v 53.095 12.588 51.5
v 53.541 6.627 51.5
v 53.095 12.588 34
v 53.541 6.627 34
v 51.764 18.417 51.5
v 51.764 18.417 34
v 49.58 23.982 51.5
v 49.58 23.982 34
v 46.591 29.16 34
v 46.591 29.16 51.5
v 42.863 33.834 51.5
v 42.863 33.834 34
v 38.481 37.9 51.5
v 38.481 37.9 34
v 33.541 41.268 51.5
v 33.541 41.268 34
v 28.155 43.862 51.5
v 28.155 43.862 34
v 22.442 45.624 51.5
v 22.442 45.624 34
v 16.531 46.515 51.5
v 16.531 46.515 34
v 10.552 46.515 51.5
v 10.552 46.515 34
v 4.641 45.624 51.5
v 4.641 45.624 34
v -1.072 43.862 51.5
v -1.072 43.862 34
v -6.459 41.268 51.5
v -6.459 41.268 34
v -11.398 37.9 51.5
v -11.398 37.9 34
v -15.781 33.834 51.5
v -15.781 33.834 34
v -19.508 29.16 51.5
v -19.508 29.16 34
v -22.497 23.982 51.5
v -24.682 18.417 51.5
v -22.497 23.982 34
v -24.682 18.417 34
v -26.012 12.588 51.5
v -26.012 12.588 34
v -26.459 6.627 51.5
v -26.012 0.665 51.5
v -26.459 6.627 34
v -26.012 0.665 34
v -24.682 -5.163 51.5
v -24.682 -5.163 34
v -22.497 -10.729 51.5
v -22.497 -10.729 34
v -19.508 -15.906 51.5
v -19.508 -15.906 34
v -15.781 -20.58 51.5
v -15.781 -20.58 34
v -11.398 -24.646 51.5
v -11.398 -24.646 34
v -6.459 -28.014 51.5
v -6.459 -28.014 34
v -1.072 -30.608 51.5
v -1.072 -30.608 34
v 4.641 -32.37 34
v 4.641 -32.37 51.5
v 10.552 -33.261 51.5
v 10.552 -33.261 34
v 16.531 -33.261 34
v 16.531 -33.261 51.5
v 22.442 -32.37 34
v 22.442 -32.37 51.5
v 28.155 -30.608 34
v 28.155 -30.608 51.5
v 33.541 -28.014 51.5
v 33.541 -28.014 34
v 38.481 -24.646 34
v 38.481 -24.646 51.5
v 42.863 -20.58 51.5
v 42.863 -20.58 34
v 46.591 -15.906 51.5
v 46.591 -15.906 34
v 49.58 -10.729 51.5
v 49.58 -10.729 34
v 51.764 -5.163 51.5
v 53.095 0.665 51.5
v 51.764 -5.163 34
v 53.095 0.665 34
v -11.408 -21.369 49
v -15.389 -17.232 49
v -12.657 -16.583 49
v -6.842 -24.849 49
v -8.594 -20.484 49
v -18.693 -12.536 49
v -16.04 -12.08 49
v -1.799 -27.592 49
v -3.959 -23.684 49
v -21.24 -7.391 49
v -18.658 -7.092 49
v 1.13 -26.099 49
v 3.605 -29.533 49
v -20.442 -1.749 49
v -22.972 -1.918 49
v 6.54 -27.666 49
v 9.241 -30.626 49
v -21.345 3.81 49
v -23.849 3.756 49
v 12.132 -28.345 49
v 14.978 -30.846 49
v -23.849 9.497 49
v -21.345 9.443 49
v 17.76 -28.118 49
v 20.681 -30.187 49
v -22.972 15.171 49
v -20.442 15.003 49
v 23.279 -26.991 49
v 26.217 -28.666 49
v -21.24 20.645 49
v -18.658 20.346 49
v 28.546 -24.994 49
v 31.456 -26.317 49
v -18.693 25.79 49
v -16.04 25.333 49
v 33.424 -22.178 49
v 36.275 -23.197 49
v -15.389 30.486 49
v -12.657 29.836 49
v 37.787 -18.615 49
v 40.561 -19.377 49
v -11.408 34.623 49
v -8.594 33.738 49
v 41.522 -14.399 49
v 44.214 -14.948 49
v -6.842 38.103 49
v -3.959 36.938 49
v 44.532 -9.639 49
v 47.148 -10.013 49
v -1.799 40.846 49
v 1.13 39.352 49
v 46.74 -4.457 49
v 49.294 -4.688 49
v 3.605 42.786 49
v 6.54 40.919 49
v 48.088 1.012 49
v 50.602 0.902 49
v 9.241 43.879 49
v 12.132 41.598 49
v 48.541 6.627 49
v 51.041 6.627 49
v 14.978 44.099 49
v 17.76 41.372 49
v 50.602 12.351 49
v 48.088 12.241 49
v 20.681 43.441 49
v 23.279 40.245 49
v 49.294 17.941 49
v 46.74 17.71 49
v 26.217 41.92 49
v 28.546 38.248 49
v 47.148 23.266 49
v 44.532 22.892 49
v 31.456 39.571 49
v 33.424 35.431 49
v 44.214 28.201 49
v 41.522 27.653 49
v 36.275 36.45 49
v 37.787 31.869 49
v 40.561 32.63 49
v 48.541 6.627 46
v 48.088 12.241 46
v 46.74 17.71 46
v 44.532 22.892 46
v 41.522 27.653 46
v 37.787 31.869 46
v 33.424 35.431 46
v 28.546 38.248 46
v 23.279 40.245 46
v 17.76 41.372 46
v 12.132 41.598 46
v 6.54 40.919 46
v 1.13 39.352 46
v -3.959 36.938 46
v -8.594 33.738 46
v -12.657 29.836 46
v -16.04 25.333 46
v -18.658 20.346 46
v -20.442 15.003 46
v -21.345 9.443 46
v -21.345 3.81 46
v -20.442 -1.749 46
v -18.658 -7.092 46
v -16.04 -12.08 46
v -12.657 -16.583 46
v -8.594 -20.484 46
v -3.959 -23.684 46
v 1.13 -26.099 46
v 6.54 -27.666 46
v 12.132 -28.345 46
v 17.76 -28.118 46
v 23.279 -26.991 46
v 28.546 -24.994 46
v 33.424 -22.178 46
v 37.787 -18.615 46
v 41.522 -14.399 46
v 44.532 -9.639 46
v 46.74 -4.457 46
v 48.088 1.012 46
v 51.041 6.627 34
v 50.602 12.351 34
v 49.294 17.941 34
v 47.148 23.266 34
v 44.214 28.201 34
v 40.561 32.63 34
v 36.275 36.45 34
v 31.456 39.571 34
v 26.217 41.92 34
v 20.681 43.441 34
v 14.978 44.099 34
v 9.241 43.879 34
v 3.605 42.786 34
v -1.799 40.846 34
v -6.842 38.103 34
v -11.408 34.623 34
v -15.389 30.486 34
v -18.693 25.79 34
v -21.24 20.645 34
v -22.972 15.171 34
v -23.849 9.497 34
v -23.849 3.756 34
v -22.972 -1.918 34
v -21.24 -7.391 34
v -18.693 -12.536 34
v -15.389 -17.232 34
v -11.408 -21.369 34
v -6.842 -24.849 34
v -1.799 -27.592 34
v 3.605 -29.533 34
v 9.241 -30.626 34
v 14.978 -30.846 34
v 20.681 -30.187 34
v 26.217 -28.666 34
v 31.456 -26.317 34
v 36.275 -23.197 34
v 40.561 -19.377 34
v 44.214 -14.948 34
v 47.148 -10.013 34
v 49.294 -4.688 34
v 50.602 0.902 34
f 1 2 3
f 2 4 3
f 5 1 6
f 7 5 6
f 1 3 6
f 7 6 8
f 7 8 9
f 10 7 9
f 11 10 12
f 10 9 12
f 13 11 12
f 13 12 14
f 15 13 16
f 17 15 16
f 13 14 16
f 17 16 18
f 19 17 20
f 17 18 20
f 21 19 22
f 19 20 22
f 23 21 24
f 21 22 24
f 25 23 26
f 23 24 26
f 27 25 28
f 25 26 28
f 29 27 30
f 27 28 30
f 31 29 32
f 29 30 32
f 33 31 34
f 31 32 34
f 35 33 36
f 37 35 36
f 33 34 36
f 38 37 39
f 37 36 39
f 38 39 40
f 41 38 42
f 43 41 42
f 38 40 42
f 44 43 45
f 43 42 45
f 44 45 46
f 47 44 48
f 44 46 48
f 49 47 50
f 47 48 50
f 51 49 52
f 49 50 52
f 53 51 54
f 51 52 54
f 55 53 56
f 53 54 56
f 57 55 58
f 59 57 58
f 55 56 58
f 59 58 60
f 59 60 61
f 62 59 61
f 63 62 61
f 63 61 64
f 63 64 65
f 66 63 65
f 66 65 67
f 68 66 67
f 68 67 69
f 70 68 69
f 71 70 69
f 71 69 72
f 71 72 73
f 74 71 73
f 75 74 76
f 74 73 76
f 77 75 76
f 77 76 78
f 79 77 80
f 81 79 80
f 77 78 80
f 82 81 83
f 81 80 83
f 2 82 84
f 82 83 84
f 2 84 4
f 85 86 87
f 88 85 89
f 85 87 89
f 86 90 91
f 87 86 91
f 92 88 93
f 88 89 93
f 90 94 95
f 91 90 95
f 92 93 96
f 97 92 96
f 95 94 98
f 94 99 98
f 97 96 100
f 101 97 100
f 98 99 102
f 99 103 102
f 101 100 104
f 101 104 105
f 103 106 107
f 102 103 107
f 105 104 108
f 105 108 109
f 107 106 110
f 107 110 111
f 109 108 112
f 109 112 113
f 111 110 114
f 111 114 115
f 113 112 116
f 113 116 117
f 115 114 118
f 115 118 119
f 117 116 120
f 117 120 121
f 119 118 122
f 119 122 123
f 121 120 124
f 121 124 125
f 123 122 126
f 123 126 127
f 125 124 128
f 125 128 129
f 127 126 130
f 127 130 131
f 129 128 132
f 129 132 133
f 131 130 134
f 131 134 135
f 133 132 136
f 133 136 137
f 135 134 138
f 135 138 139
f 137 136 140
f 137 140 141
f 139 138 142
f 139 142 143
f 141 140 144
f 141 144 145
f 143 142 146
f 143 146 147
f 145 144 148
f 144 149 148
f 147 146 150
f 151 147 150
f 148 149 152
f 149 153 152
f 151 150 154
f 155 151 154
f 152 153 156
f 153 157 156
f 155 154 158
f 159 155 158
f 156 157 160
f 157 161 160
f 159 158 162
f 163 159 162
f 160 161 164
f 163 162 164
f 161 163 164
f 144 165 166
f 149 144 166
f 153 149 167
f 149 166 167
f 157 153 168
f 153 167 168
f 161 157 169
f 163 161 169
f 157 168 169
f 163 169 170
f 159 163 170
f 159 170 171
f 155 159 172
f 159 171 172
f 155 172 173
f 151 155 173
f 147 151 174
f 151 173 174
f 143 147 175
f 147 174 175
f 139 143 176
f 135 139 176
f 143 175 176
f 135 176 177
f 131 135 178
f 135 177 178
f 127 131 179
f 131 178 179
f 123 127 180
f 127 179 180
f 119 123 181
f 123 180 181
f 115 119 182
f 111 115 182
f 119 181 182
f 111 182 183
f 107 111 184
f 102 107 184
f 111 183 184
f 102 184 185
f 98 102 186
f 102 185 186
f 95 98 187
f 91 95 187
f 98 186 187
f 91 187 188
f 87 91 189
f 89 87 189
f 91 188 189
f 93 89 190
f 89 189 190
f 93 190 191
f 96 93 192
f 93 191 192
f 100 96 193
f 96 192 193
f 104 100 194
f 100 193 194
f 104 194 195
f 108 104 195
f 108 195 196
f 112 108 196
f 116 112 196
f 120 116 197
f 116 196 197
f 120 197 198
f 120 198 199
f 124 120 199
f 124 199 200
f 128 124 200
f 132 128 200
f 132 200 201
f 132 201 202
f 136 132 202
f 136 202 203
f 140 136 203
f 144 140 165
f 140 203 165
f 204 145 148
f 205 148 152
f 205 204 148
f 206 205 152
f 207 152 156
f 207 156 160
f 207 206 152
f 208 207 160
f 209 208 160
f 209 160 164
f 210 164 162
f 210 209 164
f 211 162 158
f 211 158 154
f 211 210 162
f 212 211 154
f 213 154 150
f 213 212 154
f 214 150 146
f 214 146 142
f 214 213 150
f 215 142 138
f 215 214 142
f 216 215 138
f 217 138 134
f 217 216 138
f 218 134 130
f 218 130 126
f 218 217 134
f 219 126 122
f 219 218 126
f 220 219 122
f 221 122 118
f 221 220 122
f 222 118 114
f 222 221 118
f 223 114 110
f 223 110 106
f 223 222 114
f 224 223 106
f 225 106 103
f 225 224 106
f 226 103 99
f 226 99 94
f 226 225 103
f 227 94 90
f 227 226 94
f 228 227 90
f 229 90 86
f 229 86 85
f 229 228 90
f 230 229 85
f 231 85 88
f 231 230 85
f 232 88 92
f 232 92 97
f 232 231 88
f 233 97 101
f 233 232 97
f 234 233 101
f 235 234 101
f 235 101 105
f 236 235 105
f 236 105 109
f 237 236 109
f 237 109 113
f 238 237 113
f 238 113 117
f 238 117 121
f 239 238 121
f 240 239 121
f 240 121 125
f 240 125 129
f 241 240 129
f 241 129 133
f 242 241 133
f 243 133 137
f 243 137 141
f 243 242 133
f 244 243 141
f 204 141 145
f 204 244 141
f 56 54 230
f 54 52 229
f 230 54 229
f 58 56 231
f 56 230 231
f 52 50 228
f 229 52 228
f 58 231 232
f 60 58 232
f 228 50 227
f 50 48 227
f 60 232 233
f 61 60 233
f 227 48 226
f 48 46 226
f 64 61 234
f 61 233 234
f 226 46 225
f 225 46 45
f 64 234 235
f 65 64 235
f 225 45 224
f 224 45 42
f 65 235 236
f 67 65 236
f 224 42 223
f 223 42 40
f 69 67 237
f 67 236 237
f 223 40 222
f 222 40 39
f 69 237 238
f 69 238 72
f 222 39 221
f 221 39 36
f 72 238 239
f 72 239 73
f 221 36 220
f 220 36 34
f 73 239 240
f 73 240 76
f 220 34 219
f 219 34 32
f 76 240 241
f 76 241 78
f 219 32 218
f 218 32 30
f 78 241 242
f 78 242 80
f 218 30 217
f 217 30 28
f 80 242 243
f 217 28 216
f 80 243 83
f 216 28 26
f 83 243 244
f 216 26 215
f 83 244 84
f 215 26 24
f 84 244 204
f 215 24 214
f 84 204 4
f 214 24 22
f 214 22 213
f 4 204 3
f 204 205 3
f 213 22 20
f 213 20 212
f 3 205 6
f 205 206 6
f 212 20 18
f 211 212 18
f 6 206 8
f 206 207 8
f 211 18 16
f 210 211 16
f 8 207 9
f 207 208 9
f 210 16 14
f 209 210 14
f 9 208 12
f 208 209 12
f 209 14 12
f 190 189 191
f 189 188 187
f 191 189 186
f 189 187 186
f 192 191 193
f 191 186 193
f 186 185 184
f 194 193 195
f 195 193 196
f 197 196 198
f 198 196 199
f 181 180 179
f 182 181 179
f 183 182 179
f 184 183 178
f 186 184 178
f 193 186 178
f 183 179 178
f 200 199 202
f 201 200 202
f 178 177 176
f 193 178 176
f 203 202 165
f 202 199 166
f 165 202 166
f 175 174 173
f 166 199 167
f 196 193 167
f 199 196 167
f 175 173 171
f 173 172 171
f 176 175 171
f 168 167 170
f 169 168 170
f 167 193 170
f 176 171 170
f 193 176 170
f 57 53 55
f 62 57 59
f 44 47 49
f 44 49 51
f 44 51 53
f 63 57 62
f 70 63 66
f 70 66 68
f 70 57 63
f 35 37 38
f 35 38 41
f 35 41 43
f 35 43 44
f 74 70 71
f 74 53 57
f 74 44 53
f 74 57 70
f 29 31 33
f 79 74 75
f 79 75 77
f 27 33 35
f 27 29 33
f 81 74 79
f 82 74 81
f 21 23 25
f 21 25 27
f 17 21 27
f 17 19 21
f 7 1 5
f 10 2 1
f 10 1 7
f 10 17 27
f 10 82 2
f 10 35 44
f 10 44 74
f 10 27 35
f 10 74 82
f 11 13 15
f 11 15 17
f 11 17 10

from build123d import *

# Parameters (mm, degrees)
CROQUIS2_R              = 40
CROQUIS2_R_2            = 37.5
SALIENTE_EXTRUIR1_DEPTH = 12
CROQUIS3_R              = 40
CROQUIS3_R_2            = 37.5
CROQUIS3_R_3            = 35
SALIENTE_EXTRUIR2_DEPTH = 3
CROQUIS4_R              = 40
SALIENTE_EXTRUIR3_DEPTH = 2.5


with BuildPart() as part:
    # Croquis2 → Saliente-Extruir1 (new body)
    with BuildSketch(Plane.XY.offset(34)):
        with Locations((13.541348433, 6.626768313)):
            Circle(CROQUIS2_R)
        with Locations((13.541348433, 6.626768313)):
            Circle(CROQUIS2_R_2, mode=Mode.SUBTRACT)
    extrude(amount=SALIENTE_EXTRUIR1_DEPTH)

    # Croquis3 → Saliente-Extruir2 (add)
    with BuildSketch(Plane.XY.offset(46)):
        with Locations((13.541348433, 6.626768313)):
            Circle(CROQUIS3_R)
        with Locations((13.541348433, 6.626768313)):
            Circle(CROQUIS3_R_2, mode=Mode.SUBTRACT)
        with Locations((13.541348433, 6.626768313)):
            Circle(CROQUIS3_R_3)
    extrude(amount=SALIENTE_EXTRUIR2_DEPTH)

    # Croquis4 → Saliente-Extruir3 (add)
    with BuildSketch(Plane.XY.offset(49)):
        with Locations((13.541348433, 6.626768313)):
            Circle(CROQUIS4_R)
    extrude(amount=SALIENTE_EXTRUIR3_DEPTH)


solid = part.part
